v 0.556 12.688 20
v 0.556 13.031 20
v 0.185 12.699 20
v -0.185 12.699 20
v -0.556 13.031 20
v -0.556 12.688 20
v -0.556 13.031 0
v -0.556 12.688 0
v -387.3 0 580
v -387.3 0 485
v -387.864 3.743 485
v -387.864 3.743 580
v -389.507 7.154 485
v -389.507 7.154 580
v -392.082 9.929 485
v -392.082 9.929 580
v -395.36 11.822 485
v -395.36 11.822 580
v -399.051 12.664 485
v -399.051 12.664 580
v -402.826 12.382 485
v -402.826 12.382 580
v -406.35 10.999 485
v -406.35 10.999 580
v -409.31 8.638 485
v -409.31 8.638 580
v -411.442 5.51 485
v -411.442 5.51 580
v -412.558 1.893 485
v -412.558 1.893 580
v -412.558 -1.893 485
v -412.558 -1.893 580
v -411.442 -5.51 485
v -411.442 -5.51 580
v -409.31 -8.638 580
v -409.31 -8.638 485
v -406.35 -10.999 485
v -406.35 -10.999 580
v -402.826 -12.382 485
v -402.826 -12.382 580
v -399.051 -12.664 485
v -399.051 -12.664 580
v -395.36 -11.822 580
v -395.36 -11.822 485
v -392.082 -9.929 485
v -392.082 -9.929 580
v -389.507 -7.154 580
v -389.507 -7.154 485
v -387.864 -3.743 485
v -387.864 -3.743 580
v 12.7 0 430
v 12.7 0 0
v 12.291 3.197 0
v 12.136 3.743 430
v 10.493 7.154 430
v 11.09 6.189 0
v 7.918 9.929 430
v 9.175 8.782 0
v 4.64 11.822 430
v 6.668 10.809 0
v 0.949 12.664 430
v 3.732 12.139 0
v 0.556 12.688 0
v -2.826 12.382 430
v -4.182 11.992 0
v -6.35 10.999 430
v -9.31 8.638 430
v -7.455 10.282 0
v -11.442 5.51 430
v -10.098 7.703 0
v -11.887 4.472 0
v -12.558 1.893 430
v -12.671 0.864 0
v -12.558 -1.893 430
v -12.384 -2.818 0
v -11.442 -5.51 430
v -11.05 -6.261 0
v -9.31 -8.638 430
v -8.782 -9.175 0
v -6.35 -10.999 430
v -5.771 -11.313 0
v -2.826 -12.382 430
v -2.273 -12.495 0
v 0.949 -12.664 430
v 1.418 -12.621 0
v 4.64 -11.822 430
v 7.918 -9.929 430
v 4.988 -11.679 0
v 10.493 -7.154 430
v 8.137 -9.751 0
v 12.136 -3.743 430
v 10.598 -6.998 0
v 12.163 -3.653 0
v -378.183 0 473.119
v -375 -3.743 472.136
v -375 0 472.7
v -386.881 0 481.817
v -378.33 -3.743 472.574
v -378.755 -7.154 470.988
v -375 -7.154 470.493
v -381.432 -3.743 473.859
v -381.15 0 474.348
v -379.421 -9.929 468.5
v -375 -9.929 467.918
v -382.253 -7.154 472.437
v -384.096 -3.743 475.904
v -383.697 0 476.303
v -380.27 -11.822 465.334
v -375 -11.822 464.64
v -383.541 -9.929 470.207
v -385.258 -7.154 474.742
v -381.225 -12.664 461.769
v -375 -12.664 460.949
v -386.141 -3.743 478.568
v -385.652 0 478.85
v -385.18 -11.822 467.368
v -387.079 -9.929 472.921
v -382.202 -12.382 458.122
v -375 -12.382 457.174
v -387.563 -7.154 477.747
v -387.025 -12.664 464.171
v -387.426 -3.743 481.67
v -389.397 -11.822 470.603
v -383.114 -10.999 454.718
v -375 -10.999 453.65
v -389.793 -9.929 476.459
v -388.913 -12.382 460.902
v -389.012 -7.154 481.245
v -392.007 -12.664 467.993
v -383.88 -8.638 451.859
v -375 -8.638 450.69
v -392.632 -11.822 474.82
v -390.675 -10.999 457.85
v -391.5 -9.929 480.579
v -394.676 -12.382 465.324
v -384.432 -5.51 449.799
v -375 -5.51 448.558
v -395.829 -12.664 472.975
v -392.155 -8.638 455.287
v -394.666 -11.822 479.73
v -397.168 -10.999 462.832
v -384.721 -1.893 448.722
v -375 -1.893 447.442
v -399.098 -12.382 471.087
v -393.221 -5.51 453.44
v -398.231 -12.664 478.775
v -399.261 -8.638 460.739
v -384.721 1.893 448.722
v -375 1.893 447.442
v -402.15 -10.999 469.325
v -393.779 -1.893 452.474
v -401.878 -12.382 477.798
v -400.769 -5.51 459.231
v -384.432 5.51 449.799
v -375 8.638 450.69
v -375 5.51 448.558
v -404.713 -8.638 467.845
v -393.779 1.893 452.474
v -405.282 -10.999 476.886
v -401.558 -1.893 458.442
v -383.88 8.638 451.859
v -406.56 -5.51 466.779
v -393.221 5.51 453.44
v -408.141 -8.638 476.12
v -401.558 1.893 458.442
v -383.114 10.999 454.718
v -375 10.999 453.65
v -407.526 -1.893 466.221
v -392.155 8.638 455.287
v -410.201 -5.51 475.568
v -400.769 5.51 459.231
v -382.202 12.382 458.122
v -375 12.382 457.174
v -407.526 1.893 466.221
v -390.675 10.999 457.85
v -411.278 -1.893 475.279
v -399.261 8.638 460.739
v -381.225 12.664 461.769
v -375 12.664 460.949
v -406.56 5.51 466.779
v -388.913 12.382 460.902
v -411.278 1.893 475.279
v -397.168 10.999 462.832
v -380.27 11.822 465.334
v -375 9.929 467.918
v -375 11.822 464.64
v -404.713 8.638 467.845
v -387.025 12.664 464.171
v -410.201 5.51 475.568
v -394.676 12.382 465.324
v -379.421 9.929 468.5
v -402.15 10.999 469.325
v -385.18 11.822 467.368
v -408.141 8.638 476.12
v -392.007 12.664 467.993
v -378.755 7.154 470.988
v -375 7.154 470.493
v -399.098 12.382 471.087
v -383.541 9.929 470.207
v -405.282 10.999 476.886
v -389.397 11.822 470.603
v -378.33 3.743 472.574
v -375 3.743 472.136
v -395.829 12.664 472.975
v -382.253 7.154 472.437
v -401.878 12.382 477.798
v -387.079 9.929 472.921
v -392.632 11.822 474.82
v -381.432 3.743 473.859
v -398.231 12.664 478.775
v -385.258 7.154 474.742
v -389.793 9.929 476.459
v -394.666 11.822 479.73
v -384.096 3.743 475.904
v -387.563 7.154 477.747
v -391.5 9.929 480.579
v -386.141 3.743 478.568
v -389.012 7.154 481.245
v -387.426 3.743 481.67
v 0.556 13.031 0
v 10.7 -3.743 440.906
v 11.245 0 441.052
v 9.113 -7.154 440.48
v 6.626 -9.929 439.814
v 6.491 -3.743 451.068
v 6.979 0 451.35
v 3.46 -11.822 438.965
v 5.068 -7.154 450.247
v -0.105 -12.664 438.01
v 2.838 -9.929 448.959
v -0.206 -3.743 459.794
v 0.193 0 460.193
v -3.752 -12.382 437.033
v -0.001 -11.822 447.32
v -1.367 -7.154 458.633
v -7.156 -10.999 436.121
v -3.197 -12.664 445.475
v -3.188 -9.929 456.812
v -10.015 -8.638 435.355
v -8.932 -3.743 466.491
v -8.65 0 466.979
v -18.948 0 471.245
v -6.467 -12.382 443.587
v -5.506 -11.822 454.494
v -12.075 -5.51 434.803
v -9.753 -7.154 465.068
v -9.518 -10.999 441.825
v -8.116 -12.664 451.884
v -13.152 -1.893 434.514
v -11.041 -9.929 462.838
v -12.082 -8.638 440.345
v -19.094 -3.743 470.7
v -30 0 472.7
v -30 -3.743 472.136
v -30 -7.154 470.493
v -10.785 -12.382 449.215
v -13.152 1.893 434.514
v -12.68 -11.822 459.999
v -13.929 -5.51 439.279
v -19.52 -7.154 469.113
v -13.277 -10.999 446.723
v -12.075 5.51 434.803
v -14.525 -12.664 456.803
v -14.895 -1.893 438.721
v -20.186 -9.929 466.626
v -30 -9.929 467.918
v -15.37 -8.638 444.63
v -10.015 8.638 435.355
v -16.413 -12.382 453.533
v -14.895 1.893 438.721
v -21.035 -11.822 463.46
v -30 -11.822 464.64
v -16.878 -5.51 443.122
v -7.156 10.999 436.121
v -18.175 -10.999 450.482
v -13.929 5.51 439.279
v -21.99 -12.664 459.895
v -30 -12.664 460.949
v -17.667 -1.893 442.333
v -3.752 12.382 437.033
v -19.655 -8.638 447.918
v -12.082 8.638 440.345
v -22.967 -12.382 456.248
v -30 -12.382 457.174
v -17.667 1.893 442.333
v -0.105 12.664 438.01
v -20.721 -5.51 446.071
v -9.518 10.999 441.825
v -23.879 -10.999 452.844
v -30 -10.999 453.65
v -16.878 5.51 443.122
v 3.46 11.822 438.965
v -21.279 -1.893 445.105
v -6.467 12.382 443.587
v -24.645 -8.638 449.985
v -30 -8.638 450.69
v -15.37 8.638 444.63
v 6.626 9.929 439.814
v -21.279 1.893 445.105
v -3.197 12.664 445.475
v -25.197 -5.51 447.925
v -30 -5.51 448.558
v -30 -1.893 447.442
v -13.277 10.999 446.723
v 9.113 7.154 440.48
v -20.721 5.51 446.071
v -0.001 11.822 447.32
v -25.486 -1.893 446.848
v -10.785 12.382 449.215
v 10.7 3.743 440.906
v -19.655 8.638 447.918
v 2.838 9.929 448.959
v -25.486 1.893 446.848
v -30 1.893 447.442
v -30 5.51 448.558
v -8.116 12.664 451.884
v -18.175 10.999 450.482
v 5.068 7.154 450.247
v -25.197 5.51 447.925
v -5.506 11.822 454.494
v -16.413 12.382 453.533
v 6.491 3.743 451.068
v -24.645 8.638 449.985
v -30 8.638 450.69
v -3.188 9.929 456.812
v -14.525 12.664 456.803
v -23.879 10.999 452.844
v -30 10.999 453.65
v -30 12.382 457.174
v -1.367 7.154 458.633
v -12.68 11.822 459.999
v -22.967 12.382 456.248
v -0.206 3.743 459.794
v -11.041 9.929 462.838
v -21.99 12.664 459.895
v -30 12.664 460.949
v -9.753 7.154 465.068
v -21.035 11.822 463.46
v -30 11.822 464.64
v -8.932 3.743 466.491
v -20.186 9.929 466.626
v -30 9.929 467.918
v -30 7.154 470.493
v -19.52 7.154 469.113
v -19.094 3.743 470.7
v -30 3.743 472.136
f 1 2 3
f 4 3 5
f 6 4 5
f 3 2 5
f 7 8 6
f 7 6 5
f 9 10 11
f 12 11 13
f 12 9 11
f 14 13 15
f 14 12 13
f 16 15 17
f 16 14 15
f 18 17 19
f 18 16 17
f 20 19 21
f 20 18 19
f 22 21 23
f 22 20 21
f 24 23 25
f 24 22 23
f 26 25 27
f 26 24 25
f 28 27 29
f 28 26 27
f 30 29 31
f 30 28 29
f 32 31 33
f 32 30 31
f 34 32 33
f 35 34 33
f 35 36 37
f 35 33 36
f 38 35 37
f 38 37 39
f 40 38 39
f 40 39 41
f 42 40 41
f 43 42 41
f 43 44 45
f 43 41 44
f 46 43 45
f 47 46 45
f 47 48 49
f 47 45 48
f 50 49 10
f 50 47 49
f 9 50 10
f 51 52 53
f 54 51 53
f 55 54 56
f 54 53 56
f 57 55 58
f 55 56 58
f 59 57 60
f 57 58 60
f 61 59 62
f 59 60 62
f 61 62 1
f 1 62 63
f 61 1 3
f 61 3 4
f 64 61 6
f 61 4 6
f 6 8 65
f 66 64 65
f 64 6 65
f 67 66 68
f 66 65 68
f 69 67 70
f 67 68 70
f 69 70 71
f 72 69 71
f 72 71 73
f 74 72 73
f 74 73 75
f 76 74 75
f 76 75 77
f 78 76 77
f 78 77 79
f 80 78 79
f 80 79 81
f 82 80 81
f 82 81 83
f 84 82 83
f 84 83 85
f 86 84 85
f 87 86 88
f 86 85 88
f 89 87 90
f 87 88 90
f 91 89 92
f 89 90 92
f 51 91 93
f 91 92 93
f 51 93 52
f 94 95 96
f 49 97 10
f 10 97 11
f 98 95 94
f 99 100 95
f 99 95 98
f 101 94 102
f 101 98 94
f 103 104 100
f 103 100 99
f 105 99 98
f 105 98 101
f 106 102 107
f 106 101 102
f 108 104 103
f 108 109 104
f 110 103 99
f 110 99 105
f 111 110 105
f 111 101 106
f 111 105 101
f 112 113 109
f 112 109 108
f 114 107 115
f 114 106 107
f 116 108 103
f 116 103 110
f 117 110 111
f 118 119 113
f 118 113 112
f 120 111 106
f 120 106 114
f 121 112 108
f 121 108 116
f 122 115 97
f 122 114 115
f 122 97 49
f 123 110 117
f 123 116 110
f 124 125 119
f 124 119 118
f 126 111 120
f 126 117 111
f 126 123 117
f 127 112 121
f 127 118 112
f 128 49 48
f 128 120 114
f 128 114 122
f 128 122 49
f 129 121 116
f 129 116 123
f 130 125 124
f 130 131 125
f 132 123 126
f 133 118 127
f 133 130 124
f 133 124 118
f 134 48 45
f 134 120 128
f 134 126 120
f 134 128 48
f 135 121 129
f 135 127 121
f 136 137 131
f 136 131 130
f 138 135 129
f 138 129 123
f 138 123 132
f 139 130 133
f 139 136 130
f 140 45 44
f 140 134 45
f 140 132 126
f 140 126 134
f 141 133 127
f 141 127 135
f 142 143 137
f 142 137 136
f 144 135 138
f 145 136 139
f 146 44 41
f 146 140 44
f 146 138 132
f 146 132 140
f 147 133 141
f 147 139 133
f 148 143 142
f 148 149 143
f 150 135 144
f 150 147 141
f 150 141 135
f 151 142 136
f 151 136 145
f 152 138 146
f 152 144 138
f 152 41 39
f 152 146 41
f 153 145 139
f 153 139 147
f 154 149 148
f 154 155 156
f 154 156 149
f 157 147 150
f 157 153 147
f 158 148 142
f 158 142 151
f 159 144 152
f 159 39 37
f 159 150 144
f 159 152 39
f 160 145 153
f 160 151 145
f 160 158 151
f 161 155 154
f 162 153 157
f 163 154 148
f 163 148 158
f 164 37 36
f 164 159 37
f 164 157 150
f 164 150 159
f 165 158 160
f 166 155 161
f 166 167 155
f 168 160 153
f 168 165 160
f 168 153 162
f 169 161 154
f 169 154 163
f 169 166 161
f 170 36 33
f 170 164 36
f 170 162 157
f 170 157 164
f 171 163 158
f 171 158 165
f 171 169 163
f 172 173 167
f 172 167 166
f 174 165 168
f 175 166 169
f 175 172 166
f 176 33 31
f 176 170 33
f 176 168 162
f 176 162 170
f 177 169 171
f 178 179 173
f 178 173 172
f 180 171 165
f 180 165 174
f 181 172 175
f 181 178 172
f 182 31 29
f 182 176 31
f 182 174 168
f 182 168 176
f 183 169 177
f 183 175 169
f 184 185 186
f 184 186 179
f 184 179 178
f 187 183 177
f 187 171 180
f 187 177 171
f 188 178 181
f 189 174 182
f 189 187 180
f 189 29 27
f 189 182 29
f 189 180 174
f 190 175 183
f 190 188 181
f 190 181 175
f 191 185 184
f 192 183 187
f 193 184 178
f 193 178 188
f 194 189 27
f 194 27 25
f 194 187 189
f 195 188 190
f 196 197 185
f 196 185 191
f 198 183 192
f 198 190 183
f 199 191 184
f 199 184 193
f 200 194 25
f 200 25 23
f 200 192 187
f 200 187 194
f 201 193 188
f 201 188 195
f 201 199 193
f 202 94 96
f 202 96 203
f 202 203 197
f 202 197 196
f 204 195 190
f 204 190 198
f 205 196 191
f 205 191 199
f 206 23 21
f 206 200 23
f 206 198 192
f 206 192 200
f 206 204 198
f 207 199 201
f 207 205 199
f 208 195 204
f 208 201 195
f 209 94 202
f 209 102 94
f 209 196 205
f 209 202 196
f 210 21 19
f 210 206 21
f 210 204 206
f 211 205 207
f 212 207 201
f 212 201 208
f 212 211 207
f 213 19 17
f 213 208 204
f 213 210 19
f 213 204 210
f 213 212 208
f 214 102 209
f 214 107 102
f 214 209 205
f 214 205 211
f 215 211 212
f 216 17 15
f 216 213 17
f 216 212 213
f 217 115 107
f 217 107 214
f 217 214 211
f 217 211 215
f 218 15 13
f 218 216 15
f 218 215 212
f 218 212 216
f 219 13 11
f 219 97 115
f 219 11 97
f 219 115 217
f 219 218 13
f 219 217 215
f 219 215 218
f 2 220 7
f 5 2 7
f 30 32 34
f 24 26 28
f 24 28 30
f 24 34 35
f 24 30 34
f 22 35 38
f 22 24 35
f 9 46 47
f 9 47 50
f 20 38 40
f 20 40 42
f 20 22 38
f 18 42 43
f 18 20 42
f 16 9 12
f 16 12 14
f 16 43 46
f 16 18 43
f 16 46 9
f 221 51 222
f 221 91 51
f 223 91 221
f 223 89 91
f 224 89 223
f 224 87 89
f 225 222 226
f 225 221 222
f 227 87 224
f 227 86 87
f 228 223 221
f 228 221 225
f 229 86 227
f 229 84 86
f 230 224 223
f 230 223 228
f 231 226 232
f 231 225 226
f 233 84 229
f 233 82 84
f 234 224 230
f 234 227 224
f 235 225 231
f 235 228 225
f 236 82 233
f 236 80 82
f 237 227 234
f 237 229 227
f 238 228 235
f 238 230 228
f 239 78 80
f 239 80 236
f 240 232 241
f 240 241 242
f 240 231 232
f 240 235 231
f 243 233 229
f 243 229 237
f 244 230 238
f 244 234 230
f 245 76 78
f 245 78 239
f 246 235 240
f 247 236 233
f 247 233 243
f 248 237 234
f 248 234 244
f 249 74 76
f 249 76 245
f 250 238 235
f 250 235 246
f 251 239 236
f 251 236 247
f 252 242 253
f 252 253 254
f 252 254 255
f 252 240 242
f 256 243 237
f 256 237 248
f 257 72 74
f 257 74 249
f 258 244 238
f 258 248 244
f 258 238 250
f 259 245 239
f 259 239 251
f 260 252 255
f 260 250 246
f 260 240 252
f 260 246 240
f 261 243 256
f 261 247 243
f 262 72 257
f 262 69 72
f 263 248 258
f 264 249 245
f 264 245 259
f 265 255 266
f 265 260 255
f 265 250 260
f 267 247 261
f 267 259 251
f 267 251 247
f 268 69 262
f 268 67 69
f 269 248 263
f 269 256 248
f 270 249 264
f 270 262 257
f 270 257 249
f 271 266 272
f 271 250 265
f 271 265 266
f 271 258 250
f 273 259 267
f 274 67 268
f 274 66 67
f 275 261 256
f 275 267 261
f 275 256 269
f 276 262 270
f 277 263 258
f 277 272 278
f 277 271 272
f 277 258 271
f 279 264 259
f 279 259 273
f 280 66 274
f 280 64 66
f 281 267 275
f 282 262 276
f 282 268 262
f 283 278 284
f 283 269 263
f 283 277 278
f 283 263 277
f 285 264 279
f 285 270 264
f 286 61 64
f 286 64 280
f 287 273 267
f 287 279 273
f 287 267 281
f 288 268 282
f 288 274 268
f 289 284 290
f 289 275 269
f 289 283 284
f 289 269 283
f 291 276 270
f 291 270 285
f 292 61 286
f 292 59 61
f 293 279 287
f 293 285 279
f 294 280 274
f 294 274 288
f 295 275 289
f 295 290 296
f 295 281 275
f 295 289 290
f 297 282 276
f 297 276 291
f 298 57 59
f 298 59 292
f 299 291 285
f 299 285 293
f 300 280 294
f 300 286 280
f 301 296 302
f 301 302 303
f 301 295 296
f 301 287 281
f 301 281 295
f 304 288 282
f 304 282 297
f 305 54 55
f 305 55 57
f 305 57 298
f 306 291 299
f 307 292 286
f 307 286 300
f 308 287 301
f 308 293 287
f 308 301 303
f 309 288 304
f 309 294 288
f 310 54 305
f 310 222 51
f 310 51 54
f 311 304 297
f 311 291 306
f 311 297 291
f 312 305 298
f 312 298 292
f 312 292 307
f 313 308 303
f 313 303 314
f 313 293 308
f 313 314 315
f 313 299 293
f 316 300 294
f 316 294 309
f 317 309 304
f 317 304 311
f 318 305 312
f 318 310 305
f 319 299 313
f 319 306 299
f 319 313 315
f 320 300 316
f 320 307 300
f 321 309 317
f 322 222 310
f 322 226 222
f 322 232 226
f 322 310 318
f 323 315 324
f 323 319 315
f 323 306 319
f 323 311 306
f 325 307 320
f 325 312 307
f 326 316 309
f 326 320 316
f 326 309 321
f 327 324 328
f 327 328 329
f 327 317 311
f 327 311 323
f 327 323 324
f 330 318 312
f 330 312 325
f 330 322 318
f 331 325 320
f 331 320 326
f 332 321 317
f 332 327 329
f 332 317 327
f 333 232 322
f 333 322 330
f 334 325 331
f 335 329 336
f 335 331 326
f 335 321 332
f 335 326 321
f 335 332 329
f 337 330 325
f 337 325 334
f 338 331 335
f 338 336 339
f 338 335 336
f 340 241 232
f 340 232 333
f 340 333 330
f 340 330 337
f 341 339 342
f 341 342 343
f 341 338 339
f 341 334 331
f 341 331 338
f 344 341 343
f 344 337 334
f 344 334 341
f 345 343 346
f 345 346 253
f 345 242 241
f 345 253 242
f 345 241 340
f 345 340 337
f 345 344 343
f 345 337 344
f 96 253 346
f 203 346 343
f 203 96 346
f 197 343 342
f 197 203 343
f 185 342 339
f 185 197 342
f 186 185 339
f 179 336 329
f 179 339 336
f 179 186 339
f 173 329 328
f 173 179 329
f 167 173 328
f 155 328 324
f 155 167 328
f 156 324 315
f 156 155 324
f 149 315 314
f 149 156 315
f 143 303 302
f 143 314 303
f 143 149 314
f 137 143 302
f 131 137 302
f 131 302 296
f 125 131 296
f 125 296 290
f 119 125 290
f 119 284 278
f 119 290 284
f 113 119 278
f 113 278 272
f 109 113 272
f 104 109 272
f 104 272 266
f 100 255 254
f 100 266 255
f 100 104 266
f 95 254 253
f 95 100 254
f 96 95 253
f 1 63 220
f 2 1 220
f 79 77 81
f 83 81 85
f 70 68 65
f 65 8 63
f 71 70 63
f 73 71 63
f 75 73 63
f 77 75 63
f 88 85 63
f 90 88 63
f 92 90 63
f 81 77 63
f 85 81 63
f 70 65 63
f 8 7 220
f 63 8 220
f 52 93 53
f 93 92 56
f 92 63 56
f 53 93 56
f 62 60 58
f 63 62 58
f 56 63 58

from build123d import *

# Parameters (mm, degrees)
CROQUIS1_R              = 12.7
SALIENTE_EXTRUIR1_DEPTH = 10
CROQUIS2_R              = 12.7
CROQUIS3_W              = 1.11169581
CROQUIS3_H              = 0.66183921
SALIENTE_EXTRUIR2_DEPTH = 20


with BuildPart() as part:
    # Croquis1 → Saliente-Extruir1 (new body)
    with BuildSketch(Plane.XY):
        Circle(CROQUIS1_R)
    extrude(amount=SALIENTE_EXTRUIR1_DEPTH)

    # Barrer1: sweep along a curve in space
    with BuildLine() as barrer1_path:
        Line((0, 0, 10), (0, 0, 430))
        ThreePointArc((0, 0, 430), (-8.786796564, 0, 451.213203436), (-30, 0, 460))
        Line((-30, 0, 460), (-375, 0, 460))
        ThreePointArc((-375, 0, 460), (-392.67766953, 0, 467.32233047), (-400, 0, 485))
        Line((-400, 0, 485), (-400, 0, 580))
    # Croquis2 → Barrer1 (sweep)
    with BuildSketch(Plane.XY.offset(10)):
        Circle(CROQUIS2_R)
    sweep(path=barrer1_path.line)

    # Croquis3 → Saliente-Extruir2 (add)
    with BuildSketch(Plane(origin=(0, 0, 0), x_dir=(-1, 0, 0), z_dir=(0, 0, -1))):
        with Locations((0, 12.7)):
            Rectangle(CROQUIS3_W, CROQUIS3_H)
    extrude(amount=-SALIENTE_EXTRUIR2_DEPTH)


solid = part.part
